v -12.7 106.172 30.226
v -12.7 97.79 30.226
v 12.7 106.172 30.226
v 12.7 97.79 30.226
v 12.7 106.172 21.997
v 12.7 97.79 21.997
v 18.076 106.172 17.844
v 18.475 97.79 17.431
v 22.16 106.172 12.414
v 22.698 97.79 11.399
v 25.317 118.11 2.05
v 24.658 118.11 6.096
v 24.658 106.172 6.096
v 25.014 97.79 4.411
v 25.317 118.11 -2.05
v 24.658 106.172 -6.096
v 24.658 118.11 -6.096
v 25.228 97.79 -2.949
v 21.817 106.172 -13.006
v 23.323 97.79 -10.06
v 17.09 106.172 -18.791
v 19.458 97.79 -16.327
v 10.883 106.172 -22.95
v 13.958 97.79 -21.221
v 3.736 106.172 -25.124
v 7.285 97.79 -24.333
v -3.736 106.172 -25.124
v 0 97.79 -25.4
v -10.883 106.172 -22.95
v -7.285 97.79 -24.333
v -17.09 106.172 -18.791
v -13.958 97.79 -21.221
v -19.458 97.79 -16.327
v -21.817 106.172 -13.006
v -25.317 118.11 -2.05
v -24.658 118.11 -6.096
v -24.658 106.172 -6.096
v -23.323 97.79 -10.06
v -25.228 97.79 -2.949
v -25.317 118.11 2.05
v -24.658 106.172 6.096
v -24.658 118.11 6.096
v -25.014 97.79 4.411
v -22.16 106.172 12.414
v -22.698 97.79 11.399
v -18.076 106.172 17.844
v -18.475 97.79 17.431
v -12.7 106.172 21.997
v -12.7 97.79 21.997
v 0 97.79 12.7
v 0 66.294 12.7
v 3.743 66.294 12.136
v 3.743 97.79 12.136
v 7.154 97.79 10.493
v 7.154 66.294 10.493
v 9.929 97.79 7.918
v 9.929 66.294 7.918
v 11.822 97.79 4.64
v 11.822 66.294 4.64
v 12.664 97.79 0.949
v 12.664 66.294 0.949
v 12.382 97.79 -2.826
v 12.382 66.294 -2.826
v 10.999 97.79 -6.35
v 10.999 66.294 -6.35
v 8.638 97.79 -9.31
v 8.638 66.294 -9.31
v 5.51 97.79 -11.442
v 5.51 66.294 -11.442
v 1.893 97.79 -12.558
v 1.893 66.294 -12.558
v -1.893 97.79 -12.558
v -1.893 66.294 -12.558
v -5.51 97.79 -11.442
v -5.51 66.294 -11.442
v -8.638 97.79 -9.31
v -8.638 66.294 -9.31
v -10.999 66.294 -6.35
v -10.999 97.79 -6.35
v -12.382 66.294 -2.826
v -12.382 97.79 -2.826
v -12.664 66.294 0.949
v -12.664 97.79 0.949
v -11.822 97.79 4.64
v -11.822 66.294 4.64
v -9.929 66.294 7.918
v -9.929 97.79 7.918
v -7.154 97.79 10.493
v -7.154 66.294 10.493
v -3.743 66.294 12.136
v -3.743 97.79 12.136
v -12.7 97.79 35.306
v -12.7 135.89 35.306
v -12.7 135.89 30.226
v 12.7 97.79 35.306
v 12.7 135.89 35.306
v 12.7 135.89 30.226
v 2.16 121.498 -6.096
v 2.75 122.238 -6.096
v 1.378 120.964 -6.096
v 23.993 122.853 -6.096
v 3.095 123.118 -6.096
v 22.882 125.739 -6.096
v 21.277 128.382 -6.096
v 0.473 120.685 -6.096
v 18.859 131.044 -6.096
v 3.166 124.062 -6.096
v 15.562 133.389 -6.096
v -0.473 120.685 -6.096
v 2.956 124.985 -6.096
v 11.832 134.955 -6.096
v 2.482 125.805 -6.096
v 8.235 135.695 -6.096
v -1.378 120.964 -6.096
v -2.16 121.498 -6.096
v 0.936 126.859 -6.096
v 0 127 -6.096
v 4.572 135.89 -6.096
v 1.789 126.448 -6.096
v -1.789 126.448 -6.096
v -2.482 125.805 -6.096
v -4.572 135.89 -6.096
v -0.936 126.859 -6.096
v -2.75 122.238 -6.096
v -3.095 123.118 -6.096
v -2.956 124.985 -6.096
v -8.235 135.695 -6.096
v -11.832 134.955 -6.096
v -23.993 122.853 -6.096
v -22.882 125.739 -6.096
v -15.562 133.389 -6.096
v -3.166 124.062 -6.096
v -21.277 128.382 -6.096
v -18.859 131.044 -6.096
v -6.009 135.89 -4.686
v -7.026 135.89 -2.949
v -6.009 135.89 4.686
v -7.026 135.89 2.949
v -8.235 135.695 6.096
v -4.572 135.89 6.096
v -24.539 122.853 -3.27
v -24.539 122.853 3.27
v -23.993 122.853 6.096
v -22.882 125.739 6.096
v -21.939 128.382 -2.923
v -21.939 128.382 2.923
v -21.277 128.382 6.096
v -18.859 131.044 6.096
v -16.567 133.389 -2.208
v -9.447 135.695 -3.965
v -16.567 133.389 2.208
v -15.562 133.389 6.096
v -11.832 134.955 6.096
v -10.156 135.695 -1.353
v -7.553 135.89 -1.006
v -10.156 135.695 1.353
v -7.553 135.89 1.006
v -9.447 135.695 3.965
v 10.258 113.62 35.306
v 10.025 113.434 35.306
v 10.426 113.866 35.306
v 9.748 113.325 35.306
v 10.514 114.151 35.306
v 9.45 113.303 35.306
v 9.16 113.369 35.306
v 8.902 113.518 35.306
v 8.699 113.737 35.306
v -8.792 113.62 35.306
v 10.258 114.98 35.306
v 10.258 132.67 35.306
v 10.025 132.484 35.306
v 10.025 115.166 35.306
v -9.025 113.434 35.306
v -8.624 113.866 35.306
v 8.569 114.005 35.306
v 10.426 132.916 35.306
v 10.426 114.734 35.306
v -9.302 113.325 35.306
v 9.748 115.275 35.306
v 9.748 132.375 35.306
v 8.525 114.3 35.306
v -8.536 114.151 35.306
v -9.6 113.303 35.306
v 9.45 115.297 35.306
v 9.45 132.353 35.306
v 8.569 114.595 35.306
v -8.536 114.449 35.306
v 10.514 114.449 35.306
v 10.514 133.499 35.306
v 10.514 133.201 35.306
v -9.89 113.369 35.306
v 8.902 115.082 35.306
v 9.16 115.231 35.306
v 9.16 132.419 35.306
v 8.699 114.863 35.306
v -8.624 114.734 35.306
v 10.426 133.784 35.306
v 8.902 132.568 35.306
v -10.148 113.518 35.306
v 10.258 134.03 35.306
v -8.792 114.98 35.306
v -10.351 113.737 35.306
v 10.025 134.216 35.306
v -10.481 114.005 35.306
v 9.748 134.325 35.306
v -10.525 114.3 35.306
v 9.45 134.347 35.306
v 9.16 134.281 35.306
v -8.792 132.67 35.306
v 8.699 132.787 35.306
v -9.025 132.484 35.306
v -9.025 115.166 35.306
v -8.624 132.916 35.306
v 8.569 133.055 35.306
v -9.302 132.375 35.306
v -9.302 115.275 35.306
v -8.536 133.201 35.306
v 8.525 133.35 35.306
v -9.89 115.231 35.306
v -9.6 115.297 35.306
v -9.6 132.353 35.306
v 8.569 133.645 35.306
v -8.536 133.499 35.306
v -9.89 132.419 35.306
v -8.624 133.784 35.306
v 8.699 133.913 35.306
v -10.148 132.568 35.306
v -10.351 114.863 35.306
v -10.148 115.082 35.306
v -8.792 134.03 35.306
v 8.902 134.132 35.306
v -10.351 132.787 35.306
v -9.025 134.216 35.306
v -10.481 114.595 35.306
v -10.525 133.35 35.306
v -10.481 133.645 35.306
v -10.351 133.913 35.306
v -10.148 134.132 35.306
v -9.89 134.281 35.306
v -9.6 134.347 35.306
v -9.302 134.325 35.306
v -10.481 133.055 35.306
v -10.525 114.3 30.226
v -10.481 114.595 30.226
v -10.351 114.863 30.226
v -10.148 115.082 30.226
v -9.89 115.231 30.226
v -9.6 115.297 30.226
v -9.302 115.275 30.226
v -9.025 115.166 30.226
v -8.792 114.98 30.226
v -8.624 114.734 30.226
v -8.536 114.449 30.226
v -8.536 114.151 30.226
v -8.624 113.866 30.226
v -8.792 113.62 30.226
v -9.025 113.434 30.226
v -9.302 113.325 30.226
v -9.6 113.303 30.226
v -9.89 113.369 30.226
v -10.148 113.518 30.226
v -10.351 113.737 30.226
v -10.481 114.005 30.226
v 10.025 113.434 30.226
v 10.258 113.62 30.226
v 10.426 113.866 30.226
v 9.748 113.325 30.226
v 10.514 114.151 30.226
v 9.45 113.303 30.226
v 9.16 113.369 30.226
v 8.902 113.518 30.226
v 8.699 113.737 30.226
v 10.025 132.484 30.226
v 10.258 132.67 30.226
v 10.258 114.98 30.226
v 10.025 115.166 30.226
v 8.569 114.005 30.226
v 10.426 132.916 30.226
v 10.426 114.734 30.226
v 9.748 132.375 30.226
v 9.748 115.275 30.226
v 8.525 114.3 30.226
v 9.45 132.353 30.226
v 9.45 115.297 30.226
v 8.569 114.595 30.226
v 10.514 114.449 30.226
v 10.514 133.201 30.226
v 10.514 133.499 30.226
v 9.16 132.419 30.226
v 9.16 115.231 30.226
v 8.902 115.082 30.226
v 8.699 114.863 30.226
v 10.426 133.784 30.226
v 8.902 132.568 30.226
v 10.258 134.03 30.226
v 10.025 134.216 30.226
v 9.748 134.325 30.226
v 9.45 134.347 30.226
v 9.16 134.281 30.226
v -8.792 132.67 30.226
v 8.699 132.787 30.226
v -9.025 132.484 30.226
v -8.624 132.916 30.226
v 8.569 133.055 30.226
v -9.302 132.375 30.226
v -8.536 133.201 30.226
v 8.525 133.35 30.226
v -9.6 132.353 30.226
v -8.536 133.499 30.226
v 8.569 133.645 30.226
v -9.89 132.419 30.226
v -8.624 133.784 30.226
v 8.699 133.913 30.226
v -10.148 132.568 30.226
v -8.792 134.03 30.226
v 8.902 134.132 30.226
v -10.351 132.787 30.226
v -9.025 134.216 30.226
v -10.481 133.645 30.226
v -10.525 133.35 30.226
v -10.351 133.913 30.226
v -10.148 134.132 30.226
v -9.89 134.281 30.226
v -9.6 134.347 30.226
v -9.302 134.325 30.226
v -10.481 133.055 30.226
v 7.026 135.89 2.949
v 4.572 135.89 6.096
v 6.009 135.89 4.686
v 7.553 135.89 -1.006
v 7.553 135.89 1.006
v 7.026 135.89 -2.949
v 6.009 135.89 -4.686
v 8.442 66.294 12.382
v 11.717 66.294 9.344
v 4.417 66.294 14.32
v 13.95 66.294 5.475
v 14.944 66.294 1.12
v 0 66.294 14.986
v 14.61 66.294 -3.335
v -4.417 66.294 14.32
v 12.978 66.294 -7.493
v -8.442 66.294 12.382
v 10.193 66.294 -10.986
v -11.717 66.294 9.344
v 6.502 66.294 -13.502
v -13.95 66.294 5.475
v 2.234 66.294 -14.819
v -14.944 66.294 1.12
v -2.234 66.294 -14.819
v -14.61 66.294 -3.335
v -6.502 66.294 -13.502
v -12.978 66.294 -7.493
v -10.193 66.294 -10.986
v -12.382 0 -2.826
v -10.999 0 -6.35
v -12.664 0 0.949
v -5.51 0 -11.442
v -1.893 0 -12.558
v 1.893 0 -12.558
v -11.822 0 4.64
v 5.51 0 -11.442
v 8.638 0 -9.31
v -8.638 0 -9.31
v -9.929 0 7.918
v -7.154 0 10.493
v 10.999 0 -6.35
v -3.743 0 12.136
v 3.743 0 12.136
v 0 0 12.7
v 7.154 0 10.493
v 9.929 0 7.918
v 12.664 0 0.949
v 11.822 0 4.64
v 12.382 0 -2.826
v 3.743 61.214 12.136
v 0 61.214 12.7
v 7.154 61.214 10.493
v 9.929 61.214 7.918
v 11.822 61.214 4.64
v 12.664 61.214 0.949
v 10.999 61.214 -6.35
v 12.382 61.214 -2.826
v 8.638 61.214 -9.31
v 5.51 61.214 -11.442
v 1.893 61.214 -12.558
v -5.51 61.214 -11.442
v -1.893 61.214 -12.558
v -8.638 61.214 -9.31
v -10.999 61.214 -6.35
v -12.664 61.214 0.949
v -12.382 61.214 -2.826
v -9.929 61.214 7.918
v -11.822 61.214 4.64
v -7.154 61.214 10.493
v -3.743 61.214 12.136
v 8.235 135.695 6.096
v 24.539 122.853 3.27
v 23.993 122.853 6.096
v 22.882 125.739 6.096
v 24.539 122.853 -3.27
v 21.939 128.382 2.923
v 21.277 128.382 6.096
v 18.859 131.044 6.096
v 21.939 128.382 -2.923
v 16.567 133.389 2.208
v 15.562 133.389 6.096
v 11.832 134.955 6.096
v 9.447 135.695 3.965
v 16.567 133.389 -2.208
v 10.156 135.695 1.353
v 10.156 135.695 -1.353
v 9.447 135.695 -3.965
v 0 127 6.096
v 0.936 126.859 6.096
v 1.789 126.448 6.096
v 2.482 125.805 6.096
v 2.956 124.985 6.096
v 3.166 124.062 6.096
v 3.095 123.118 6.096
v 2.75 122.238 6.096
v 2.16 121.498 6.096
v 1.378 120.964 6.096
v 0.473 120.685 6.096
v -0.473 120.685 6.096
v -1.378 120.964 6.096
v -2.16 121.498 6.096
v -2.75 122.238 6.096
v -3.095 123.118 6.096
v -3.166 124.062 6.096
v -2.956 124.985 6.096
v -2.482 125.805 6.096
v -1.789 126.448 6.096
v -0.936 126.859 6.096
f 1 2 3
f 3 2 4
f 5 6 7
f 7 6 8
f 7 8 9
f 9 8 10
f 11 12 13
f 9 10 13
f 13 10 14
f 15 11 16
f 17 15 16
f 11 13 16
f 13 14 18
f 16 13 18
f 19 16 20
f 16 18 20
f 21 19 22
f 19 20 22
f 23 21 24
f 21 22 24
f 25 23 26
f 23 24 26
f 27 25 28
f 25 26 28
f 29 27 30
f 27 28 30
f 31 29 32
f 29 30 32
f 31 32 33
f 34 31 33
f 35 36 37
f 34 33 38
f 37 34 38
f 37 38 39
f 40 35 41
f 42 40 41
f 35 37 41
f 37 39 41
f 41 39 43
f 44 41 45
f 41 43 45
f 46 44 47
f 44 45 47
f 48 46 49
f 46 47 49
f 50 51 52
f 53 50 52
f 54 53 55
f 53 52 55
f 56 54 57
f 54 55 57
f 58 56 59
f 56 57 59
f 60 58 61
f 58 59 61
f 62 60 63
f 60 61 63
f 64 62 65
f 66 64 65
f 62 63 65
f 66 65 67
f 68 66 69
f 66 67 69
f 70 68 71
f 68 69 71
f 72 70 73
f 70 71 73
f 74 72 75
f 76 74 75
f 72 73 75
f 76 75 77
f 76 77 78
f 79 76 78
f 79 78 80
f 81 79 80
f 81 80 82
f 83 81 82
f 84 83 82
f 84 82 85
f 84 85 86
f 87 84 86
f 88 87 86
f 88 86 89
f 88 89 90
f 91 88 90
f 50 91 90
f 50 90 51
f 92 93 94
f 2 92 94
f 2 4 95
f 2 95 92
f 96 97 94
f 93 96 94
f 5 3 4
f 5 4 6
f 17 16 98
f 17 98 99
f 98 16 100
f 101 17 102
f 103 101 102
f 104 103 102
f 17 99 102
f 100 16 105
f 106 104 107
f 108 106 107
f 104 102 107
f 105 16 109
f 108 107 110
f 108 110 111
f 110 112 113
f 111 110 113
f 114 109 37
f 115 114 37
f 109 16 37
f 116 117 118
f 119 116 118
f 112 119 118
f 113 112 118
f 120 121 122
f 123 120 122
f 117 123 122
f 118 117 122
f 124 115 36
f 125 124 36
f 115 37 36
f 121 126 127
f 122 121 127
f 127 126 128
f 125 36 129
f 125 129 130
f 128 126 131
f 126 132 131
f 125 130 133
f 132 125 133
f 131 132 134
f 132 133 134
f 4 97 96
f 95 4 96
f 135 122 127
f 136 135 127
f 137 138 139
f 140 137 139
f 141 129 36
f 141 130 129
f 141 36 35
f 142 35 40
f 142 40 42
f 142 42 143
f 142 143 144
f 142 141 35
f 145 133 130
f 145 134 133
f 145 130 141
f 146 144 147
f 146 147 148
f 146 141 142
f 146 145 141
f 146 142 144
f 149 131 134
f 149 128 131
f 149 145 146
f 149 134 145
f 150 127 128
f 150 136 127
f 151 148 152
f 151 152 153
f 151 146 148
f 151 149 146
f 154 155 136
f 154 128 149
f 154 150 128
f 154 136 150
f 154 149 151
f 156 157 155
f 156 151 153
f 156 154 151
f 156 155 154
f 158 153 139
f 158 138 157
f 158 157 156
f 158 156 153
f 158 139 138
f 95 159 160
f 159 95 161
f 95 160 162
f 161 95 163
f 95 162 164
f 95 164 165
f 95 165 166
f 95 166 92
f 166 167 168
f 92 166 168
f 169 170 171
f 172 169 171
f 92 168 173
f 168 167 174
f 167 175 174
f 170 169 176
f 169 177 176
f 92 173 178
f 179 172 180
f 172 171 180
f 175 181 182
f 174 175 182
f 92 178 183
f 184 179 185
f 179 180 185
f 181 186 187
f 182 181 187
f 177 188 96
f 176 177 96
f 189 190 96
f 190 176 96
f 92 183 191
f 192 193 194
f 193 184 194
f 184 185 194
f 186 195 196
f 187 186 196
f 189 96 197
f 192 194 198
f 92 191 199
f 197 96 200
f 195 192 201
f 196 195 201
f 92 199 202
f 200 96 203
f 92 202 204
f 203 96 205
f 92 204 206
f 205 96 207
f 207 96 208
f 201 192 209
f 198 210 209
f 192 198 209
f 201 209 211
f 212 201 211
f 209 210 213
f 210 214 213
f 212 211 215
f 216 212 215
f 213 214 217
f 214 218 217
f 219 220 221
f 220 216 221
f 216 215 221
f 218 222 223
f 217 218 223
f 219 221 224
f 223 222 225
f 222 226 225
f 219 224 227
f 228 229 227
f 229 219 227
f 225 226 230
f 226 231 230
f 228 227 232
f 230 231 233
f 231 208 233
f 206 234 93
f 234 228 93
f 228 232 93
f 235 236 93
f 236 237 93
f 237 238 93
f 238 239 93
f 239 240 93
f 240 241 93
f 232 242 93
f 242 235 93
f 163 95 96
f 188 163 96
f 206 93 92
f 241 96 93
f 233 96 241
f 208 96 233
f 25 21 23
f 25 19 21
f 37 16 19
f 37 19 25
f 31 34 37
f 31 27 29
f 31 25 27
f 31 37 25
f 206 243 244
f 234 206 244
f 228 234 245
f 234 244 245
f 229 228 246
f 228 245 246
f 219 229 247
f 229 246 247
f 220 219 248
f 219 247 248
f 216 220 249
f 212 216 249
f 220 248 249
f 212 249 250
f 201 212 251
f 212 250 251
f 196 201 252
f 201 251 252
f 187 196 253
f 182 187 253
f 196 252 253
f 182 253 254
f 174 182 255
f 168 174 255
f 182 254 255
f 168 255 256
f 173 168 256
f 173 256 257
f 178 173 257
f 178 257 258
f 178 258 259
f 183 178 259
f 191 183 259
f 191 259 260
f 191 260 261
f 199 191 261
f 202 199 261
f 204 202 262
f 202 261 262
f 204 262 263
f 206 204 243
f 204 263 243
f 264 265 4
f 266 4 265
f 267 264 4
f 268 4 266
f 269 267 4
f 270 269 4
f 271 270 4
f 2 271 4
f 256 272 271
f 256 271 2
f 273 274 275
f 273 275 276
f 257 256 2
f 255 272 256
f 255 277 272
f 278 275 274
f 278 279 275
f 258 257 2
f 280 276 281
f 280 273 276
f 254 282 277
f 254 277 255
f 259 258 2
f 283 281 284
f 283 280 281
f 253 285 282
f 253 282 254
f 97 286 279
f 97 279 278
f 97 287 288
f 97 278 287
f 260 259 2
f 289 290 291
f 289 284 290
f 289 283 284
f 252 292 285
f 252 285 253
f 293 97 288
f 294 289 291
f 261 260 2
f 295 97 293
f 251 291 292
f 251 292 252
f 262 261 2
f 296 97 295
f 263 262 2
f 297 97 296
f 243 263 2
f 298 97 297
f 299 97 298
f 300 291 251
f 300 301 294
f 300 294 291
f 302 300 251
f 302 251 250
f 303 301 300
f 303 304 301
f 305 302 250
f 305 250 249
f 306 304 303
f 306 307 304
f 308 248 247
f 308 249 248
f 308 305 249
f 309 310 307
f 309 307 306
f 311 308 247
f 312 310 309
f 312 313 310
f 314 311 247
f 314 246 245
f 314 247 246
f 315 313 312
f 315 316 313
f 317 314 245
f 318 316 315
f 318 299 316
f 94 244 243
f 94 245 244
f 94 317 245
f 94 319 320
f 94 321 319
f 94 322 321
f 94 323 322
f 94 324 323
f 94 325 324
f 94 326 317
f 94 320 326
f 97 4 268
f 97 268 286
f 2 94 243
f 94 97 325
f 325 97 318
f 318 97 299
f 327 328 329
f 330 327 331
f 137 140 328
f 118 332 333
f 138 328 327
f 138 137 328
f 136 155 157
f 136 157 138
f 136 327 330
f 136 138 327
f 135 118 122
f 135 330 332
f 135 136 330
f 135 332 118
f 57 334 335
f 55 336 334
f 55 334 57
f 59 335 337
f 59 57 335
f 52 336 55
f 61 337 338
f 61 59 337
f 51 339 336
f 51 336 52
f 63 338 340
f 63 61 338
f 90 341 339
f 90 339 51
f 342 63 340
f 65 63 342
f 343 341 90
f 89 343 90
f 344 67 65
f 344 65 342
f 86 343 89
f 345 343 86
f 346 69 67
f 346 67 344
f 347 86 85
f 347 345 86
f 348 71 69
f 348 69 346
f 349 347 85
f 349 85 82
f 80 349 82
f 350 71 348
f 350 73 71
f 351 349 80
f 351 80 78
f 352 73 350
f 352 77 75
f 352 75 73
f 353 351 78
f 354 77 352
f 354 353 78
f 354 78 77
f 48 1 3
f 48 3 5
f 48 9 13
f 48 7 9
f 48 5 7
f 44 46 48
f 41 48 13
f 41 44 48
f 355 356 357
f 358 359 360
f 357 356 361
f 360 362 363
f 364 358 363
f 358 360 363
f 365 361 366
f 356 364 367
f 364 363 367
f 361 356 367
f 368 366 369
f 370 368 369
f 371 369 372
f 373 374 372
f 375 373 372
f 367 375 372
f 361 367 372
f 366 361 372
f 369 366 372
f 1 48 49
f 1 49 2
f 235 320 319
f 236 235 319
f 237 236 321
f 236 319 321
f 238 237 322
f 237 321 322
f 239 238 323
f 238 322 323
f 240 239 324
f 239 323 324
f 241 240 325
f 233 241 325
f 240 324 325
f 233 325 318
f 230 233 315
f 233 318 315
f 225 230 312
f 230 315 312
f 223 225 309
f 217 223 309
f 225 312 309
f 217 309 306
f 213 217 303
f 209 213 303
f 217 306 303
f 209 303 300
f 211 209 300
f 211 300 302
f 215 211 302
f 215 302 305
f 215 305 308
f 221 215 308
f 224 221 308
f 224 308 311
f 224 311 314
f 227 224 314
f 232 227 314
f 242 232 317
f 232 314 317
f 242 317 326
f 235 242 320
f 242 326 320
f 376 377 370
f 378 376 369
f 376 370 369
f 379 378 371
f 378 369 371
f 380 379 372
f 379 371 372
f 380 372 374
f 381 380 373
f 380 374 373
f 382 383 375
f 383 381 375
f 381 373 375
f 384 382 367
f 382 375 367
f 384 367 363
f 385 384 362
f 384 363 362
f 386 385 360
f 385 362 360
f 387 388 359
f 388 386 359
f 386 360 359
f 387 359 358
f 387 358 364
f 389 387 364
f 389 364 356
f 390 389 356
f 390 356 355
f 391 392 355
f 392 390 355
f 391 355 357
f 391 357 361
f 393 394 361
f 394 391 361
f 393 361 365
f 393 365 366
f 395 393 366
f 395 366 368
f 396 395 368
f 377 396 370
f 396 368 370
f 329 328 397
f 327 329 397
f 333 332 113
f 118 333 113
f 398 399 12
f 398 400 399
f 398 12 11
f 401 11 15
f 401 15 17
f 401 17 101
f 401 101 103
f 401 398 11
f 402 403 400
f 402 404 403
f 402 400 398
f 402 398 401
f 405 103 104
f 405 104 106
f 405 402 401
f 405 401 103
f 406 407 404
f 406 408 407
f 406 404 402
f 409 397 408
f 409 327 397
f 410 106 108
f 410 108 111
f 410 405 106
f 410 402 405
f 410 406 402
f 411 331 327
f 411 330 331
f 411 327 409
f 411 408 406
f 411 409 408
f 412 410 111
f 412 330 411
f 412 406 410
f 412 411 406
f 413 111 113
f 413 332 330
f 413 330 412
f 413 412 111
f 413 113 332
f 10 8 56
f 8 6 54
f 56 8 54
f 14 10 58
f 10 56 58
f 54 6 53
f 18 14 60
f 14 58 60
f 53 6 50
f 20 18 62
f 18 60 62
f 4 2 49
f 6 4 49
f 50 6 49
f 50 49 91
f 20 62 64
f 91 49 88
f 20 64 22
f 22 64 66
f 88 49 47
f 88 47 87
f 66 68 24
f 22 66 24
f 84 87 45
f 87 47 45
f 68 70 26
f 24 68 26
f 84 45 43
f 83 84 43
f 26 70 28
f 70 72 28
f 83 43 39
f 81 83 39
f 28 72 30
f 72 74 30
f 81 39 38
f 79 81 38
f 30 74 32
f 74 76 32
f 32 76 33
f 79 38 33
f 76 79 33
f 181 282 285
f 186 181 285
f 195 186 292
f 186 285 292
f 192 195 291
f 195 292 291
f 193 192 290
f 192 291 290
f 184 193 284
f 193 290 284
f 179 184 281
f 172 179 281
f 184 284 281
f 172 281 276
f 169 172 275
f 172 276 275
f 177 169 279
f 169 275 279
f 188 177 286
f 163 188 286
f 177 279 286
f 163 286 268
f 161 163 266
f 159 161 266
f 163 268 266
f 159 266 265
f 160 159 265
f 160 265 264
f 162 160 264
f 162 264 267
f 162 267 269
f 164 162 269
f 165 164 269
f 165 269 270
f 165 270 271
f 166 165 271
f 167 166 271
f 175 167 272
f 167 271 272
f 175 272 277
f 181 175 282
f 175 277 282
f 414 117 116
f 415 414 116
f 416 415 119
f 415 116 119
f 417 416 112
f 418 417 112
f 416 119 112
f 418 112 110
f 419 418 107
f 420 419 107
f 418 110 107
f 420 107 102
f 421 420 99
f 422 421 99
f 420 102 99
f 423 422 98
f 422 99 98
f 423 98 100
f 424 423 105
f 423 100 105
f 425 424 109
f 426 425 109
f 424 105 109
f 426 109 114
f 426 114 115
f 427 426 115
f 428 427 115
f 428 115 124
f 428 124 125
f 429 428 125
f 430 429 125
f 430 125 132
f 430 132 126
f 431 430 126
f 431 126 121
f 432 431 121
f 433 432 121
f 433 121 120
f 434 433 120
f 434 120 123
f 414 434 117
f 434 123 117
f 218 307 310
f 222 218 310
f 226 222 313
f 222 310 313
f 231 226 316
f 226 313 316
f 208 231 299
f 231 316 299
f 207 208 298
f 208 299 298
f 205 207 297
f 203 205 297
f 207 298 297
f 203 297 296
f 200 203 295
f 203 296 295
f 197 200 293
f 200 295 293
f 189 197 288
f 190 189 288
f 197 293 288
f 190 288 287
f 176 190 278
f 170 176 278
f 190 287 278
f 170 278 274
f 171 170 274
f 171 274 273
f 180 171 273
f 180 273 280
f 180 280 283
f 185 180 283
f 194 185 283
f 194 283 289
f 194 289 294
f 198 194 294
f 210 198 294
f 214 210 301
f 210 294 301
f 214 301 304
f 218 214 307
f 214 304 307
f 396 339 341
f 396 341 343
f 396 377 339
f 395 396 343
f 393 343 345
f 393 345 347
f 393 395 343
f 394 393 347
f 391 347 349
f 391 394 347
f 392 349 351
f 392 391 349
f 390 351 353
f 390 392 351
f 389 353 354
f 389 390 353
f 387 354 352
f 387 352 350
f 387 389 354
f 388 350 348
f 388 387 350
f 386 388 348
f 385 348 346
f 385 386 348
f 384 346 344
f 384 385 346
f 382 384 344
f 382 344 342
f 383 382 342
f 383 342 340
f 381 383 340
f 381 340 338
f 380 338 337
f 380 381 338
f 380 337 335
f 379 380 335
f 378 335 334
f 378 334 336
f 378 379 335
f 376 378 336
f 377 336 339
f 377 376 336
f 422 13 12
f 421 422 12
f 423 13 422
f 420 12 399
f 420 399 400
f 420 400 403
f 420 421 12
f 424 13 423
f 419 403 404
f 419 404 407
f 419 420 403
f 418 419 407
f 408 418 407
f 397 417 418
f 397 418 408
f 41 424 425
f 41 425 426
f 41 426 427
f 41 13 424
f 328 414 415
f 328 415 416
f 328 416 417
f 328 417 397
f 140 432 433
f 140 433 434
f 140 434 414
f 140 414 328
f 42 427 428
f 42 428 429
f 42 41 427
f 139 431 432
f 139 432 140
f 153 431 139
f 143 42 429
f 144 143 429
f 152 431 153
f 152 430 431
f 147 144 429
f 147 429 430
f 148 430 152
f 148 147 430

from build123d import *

# Parameters (mm, degrees)
SKETCH1_R                            = 12.7
PART_THAT_GOES_INTO_BASE_DEPTH       = 97.79
SKETCH3_R                            = 25.4
TOP_PART_EXTRUDE_DEPTH               = 38.1
CUT_START                            = -75.457631354
CUT_TO_ACCOMMODATE_ENCODER_OUTLINE_W = 19.304
CUT_TO_ACCOMMODATE_ENCODER_OUTLINE_H = 29.718
CUT_TO_ACCOMMODATE_ENCODER_DEPTH     = 49.315262708
SKETCH7_R                            = 3.175
BOLT_HOLE_DEPTH                      = 12.192
FILLET_TO_ACCOMMODATE_SHOULDER_R     = 17.78
BOSS_EXTRUDE1_DEPTH                  = 38.1
BOSS_EXTRUDE2_START                  = -8.382
BOSS_EXTRUDE2_DEPTH                  = 8.382
SKETCH13_R                           = 1
CUT_EXTRUDE1_DEPTH                   = 5.08


# Read off the part's stored shape, not the designer's step: Cut to Accommodate Encoder
with BuildPart() as part:
    # Sketch1 → Part that goes into base (new body)
    with BuildSketch(Plane(origin=(0, 0, 0), x_dir=(1, 0, 0), z_dir=(0, 1, 0))):
        with Locations(Location((0, 0, 0), (0, 0, 270))):
            Circle(SKETCH1_R)
    extrude(amount=PART_THAT_GOES_INTO_BASE_DEPTH)

    # Sketch2 → Clip in mechanism (revolve)
    with BuildSketch(Plane.XY, mode=Mode.PRIVATE) as clip_in_mechanism_sk:
        Polygon((12.7, 61.214), (12.7, 66.294), (14.986, 66.294), align=None)
    revolve(clip_in_mechanism_sk.sketch.rotate(Axis((0, 97.79, 0), (0, -1, 0)), 90), axis=Axis((0, 97.79, 0), (0, -1, 0)))

    # Sketch3 → Top part Extrude (add)
    with BuildSketch(Plane(origin=(0, 97.79, 0), x_dir=(1, 0, 0), z_dir=(0, 1, 0))):
        with Locations(Location((0, 0, 0), (0, 0, 90))):
            Circle(SKETCH3_R)
    extrude(amount=TOP_PART_EXTRUDE_DEPTH)

    # Cut to Accommodate Encoder outline → Cut to Accommodate Encoder (cut)
    with BuildSketch(Plane(origin=(50.8, 0, 0), x_dir=(0, 0, -1), z_dir=(1, 0, 0)).offset(CUT_START)):
        with Locations((15.748, 121.031)):
            Rectangle(CUT_TO_ACCOMMODATE_ENCODER_OUTLINE_W, CUT_TO_ACCOMMODATE_ENCODER_OUTLINE_H)
        with Locations((-15.748, 121.031)):
            Rectangle(CUT_TO_ACCOMMODATE_ENCODER_OUTLINE_W, CUT_TO_ACCOMMODATE_ENCODER_OUTLINE_H)
    extrude(amount=CUT_TO_ACCOMMODATE_ENCODER_DEPTH, mode=Mode.SUBTRACT)

    # Sketch7 → Bolt Hole (cut)
    with BuildSketch(Plane(origin=(0, 0, -6.096), x_dir=(-1, 0, 0), z_dir=(0, 0, -1))):
        with Locations(Location((0, 123.825, 0), (0, 0, 90))):
            Circle(SKETCH7_R)
    extrude(amount=-BOLT_HOLE_DEPTH, mode=Mode.SUBTRACT)

    # Fillet to Accommodate shoulder
    fillet_to_accommodate_shoulder_edges = [part.edges().sort_by_distance(p)[0] for p in [
        (25.4, 135.89, 0),
        (-25.4, 135.89, 0),
    ]]
    fillet(fillet_to_accommodate_shoulder_edges, radius=FILLET_TO_ACCOMMODATE_SHOULDER_R)

    # Sketch12 → Boss-Extrude2 (add)
    with BuildSketch(Plane(origin=(0, 106.172, 0), x_dir=(1, 0, 0), z_dir=(0, 1, 0)).offset(BOSS_EXTRUDE2_START)):
        with BuildLine():
            Line((12.7, -23.876), (12.7, -21.997045256))
            ThreePointArc((12.7, -21.997045256), (10.724145631, -23.02504507), (8.665830831, -23.876))
            ThreePointArc((8.665830831, -23.876), (0, -25.4), (-8.665830831, -23.876))
            ThreePointArc((-8.665830831, -23.876), (-10.724145631, -23.02504507), (-12.7, -21.997045256))
            Line((-12.7, -21.997045256), (-12.7, -23.876))
            Line((-12.7, -23.876), (-12.7, -30.226))
            Line((-12.7, -30.226), (12.7, -30.226))
            Line((12.7, -30.226), (12.7, -23.876))
        make_face()
    extrude(amount=BOSS_EXTRUDE2_DEPTH)


with BuildPart() as body_2:
    # Sketch11 → Boss-Extrude1 (new body)
    with BuildSketch(Plane(origin=(0, 135.89, 0), x_dir=(1, 0, 0), z_dir=(0, 1, 0))):
        Polygon((12.7, -30.226), (12.7, -35.306), (-12.7, -35.306), (-12.7, -30.226), (-8.665830831, -30.226), (8.665830831, -30.226), align=None)
    extrude(amount=-BOSS_EXTRUDE1_DEPTH)

    # Sketch13 → Cut-Extrude1 (cut)
    with BuildSketch(Plane(origin=(0, 0, 30.226), x_dir=(-1, 0, 0), z_dir=(0, 0, -1))):
        with Locations((-9.525, 114.3)):
            Circle(SKETCH13_R)
        with Locations((-9.525, 133.35)):
            Circle(SKETCH13_R)
        with Locations((9.525, 114.3)):
            Circle(SKETCH13_R)
        with Locations((9.525, 133.35)):
            Circle(SKETCH13_R)
    extrude(amount=-CUT_EXTRUDE1_DEPTH, mode=Mode.SUBTRACT)


solid = Compound([part.part, body_2.part])
